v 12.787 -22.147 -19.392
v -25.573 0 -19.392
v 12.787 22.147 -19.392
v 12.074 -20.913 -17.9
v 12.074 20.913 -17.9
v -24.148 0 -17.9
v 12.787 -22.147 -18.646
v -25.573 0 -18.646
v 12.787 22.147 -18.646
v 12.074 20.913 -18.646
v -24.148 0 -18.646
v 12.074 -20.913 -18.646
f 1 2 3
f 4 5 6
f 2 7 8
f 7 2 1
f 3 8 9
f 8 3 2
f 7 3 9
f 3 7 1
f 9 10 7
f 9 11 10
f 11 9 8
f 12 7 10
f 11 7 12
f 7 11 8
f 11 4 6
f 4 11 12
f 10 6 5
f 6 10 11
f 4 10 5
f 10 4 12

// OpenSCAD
arete = 47.740;
paroi = 1.5;
echelleReductionAjustementBouchon = 0.96;
r = 0.19; // résolution d'impression sur l'axe Z
octa_sch = [3,4];
Cpi = 3.14159;
Cphi = (1+sqrt(5))/2;
Cepsilon = 0.00000001;

function octa_ext_radius(a) = 
    a/2*(sqrt(2));
    
function octa_int_radius(a) = 
    a/6*sqrt(6);
    
function octa_arete_from(radius) = 
    radius*6/sqrt(6);
    
externalRadius = octa_ext_radius(arete);
internalRadius = octa_ext_radius( 
                    octa_arete_from(
                        octa_int_radius(arete)-paroi));
                        
echo(externalRadius); 
echo(internalRadius);

//octahedron(arete);
//octa_creux();
//decoupe_bouchon();
//corps_ouvert();
bouchon();
//trou();

module corps_ouvert() {
	difference() {
		octa_creux();
		decoupe_bouchon();
	}
}

module bouchon() {
    rotate([180, 0, 0])
	scale([echelleReductionAjustementBouchon, echelleReductionAjustementBouchon, 0.995])
	difference () {
        intersection() {
            octa_creux();
            decoupe_bouchon(echelleReductionAjustementBouchon);
        }
	}
}

module octa_creux() {
	difference() {
        octahedron(externalRadius);
        octahedron(internalRadius);
	}
}

module decoupe_bouchon(scale=1) {
    distance = octa_int_radius(arete);
	rotate([0,0,60]) translate([0,0, distance])
		cylinder(paroi, r=arete*0.558, $fn=3, center=true);
	rotate([0,0,60]) translate([0,0, distance-paroi])
		cylinder(paroi, r=(arete-paroi)*0.544, $fn=3, center=true);
}


module octahedron(rad) {
    // create an instance of a spherical coordinate
    // long - rotation around z -axis
    // lat - latitude, starting at 0 == 'north pole'
    // rad - distance from center
    function sph(long, lat, rad=1) = [long, lat, rad];
    
    // Convert spherical to cartesian
    function sph_to_cart(s) = [
	clean(s[2]*sin(s[1])*cos(s[0])),  

	clean(s[2]*sin(s[1])*sin(s[0])),

	clean(s[2]*cos(s[1]))
	];

    function sphu_from_cart(c, rad=1) = sph(
        atan2(c[1],c[0]), 
        atan2(sqrt(c[0]*c[0]+c[1]*c[1]), c[2]), 
        rad
        );

    octa_cart = [
        [+1, 0, 0],  // + x axis
        [-1, 0, 0],	// - x axis
        [0, +1, 0],	// + y axis
        [0, -1, 0],	// - y axis
        [0, 0, +1],	// + z axis
        [0, 0, -1] 	// - z axis
    ];

    function octa_unit(rad=1) = [
        sph_to_cart(sphu_from_cart(octa_cart[0], rad)), 
        sph_to_cart(sphu_from_cart(octa_cart[1], rad)),
        sph_to_cart(sphu_from_cart(octa_cart[2], rad)),
        sph_to_cart(sphu_from_cart(octa_cart[3], rad)),
        sph_to_cart(sphu_from_cart(octa_cart[4], rad)), 
        sph_to_cart(sphu_from_cart(octa_cart[5], rad)), 
        ];

    octafaces = [
        [4,2,0],
        [4,0,3],
        [4,3,1],
        [4,1,2],
        [5,0,2],
        [5,3,0],
        [5,1,3],
        [5,2,1]
        ];

    octa_edges = [
        [0,2], 
        [0,3],
        [0,4],
        [0,5],
        [1,2],
        [1,3],
        [1,4],
        [1,5],
        [2,4], 
        [2,5],
        [3,4],
        [3,5],
        ];

    function octahedron(rad=1) = [octa_unit(rad), octafaces, octa_edges];

    rotate([0, 90-plat_dihedral(octa_sch)/2, 0])
    rotate([45, 0, 0])
    polyhedron(octa_unit(rad), faces=octafaces);
}
//translate([0, 0, -17.7])
//cylinder(5,40,40);

function clean(n) = (n < 0) ? ((n < -Cepsilon) ? n : 0) : 
	(n < Cepsilon) ? 0 : n; 

function plat_dihedral(pq) = 2 * asin( cos(180/pq[1])/sin(180/pq[0]));

function plat_circumradius(pq, a) = 
	(a/2)*
	tan(Cpi/pq[1])*
	tan(plat_dihedral(pq)/2);

function plat_midradius(pq, a) = 
	(a/2)*
	cos(Cpi/pq[0])*
	tan(plat_dihedral(pq)/2);

function plat_inradius(pq,a) = 
	a/(2*tan(Cpi/pq[0]))*
	sqrt((1-cos(plat_dihedral(pq)))/(1+cos(plat_dihedral(pq))));

function plat_a_from_inradius(pq, inradius) =
    inradius*(2*tan(Cpi/pq[0]))/
	sqrt((1-cos(plat_dihedral(pq)))/(1+cos(plat_dihedral(pq))));
